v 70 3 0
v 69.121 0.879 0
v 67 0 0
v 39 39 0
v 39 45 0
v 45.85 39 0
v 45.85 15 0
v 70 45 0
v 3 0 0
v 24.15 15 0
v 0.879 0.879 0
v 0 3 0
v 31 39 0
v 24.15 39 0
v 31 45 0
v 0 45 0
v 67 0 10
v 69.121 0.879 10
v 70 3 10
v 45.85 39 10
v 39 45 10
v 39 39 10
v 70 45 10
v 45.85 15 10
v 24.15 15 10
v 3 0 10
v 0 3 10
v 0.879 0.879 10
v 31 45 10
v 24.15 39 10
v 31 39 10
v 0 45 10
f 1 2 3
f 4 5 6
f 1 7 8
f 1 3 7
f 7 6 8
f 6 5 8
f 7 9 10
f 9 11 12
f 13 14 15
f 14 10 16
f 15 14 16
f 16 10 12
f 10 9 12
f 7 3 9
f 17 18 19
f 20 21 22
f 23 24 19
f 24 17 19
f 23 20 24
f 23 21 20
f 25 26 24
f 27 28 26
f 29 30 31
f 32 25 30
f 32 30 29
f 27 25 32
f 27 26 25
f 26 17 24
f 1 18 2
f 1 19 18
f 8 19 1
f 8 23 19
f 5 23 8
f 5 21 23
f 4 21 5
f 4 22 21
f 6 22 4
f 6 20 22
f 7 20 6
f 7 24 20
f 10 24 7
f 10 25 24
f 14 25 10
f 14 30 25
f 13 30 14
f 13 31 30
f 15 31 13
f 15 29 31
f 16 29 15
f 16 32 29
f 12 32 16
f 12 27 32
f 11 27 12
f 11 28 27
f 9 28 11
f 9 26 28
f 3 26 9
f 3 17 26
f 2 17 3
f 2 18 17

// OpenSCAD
$fn = 32;

// ----------------------------------------------------------------------
// Window plate: 70 x 45 mm, 1 open windows
// ----------------------------------------------------------------------

// --- parameters (mm) ---
profile_height = 10;      // extrusion height
profile_points = 16;      // points of the closed outline

profile = [[0, 3], [0.879, 0.879], [3, 0], [67, 0], [69.121, 0.879], [70, 3], [70, 45], [39, 45], [39, 39], [45.85, 39], [45.85, 15], [24.15, 15], [24.15, 39], [31, 39], [31, 45], [0, 45]];  // single closed polygon, 16 points, counter clockwise

// --- the one profile operation ---
linear_extrude(height = profile_height) polygon(points = profile);
